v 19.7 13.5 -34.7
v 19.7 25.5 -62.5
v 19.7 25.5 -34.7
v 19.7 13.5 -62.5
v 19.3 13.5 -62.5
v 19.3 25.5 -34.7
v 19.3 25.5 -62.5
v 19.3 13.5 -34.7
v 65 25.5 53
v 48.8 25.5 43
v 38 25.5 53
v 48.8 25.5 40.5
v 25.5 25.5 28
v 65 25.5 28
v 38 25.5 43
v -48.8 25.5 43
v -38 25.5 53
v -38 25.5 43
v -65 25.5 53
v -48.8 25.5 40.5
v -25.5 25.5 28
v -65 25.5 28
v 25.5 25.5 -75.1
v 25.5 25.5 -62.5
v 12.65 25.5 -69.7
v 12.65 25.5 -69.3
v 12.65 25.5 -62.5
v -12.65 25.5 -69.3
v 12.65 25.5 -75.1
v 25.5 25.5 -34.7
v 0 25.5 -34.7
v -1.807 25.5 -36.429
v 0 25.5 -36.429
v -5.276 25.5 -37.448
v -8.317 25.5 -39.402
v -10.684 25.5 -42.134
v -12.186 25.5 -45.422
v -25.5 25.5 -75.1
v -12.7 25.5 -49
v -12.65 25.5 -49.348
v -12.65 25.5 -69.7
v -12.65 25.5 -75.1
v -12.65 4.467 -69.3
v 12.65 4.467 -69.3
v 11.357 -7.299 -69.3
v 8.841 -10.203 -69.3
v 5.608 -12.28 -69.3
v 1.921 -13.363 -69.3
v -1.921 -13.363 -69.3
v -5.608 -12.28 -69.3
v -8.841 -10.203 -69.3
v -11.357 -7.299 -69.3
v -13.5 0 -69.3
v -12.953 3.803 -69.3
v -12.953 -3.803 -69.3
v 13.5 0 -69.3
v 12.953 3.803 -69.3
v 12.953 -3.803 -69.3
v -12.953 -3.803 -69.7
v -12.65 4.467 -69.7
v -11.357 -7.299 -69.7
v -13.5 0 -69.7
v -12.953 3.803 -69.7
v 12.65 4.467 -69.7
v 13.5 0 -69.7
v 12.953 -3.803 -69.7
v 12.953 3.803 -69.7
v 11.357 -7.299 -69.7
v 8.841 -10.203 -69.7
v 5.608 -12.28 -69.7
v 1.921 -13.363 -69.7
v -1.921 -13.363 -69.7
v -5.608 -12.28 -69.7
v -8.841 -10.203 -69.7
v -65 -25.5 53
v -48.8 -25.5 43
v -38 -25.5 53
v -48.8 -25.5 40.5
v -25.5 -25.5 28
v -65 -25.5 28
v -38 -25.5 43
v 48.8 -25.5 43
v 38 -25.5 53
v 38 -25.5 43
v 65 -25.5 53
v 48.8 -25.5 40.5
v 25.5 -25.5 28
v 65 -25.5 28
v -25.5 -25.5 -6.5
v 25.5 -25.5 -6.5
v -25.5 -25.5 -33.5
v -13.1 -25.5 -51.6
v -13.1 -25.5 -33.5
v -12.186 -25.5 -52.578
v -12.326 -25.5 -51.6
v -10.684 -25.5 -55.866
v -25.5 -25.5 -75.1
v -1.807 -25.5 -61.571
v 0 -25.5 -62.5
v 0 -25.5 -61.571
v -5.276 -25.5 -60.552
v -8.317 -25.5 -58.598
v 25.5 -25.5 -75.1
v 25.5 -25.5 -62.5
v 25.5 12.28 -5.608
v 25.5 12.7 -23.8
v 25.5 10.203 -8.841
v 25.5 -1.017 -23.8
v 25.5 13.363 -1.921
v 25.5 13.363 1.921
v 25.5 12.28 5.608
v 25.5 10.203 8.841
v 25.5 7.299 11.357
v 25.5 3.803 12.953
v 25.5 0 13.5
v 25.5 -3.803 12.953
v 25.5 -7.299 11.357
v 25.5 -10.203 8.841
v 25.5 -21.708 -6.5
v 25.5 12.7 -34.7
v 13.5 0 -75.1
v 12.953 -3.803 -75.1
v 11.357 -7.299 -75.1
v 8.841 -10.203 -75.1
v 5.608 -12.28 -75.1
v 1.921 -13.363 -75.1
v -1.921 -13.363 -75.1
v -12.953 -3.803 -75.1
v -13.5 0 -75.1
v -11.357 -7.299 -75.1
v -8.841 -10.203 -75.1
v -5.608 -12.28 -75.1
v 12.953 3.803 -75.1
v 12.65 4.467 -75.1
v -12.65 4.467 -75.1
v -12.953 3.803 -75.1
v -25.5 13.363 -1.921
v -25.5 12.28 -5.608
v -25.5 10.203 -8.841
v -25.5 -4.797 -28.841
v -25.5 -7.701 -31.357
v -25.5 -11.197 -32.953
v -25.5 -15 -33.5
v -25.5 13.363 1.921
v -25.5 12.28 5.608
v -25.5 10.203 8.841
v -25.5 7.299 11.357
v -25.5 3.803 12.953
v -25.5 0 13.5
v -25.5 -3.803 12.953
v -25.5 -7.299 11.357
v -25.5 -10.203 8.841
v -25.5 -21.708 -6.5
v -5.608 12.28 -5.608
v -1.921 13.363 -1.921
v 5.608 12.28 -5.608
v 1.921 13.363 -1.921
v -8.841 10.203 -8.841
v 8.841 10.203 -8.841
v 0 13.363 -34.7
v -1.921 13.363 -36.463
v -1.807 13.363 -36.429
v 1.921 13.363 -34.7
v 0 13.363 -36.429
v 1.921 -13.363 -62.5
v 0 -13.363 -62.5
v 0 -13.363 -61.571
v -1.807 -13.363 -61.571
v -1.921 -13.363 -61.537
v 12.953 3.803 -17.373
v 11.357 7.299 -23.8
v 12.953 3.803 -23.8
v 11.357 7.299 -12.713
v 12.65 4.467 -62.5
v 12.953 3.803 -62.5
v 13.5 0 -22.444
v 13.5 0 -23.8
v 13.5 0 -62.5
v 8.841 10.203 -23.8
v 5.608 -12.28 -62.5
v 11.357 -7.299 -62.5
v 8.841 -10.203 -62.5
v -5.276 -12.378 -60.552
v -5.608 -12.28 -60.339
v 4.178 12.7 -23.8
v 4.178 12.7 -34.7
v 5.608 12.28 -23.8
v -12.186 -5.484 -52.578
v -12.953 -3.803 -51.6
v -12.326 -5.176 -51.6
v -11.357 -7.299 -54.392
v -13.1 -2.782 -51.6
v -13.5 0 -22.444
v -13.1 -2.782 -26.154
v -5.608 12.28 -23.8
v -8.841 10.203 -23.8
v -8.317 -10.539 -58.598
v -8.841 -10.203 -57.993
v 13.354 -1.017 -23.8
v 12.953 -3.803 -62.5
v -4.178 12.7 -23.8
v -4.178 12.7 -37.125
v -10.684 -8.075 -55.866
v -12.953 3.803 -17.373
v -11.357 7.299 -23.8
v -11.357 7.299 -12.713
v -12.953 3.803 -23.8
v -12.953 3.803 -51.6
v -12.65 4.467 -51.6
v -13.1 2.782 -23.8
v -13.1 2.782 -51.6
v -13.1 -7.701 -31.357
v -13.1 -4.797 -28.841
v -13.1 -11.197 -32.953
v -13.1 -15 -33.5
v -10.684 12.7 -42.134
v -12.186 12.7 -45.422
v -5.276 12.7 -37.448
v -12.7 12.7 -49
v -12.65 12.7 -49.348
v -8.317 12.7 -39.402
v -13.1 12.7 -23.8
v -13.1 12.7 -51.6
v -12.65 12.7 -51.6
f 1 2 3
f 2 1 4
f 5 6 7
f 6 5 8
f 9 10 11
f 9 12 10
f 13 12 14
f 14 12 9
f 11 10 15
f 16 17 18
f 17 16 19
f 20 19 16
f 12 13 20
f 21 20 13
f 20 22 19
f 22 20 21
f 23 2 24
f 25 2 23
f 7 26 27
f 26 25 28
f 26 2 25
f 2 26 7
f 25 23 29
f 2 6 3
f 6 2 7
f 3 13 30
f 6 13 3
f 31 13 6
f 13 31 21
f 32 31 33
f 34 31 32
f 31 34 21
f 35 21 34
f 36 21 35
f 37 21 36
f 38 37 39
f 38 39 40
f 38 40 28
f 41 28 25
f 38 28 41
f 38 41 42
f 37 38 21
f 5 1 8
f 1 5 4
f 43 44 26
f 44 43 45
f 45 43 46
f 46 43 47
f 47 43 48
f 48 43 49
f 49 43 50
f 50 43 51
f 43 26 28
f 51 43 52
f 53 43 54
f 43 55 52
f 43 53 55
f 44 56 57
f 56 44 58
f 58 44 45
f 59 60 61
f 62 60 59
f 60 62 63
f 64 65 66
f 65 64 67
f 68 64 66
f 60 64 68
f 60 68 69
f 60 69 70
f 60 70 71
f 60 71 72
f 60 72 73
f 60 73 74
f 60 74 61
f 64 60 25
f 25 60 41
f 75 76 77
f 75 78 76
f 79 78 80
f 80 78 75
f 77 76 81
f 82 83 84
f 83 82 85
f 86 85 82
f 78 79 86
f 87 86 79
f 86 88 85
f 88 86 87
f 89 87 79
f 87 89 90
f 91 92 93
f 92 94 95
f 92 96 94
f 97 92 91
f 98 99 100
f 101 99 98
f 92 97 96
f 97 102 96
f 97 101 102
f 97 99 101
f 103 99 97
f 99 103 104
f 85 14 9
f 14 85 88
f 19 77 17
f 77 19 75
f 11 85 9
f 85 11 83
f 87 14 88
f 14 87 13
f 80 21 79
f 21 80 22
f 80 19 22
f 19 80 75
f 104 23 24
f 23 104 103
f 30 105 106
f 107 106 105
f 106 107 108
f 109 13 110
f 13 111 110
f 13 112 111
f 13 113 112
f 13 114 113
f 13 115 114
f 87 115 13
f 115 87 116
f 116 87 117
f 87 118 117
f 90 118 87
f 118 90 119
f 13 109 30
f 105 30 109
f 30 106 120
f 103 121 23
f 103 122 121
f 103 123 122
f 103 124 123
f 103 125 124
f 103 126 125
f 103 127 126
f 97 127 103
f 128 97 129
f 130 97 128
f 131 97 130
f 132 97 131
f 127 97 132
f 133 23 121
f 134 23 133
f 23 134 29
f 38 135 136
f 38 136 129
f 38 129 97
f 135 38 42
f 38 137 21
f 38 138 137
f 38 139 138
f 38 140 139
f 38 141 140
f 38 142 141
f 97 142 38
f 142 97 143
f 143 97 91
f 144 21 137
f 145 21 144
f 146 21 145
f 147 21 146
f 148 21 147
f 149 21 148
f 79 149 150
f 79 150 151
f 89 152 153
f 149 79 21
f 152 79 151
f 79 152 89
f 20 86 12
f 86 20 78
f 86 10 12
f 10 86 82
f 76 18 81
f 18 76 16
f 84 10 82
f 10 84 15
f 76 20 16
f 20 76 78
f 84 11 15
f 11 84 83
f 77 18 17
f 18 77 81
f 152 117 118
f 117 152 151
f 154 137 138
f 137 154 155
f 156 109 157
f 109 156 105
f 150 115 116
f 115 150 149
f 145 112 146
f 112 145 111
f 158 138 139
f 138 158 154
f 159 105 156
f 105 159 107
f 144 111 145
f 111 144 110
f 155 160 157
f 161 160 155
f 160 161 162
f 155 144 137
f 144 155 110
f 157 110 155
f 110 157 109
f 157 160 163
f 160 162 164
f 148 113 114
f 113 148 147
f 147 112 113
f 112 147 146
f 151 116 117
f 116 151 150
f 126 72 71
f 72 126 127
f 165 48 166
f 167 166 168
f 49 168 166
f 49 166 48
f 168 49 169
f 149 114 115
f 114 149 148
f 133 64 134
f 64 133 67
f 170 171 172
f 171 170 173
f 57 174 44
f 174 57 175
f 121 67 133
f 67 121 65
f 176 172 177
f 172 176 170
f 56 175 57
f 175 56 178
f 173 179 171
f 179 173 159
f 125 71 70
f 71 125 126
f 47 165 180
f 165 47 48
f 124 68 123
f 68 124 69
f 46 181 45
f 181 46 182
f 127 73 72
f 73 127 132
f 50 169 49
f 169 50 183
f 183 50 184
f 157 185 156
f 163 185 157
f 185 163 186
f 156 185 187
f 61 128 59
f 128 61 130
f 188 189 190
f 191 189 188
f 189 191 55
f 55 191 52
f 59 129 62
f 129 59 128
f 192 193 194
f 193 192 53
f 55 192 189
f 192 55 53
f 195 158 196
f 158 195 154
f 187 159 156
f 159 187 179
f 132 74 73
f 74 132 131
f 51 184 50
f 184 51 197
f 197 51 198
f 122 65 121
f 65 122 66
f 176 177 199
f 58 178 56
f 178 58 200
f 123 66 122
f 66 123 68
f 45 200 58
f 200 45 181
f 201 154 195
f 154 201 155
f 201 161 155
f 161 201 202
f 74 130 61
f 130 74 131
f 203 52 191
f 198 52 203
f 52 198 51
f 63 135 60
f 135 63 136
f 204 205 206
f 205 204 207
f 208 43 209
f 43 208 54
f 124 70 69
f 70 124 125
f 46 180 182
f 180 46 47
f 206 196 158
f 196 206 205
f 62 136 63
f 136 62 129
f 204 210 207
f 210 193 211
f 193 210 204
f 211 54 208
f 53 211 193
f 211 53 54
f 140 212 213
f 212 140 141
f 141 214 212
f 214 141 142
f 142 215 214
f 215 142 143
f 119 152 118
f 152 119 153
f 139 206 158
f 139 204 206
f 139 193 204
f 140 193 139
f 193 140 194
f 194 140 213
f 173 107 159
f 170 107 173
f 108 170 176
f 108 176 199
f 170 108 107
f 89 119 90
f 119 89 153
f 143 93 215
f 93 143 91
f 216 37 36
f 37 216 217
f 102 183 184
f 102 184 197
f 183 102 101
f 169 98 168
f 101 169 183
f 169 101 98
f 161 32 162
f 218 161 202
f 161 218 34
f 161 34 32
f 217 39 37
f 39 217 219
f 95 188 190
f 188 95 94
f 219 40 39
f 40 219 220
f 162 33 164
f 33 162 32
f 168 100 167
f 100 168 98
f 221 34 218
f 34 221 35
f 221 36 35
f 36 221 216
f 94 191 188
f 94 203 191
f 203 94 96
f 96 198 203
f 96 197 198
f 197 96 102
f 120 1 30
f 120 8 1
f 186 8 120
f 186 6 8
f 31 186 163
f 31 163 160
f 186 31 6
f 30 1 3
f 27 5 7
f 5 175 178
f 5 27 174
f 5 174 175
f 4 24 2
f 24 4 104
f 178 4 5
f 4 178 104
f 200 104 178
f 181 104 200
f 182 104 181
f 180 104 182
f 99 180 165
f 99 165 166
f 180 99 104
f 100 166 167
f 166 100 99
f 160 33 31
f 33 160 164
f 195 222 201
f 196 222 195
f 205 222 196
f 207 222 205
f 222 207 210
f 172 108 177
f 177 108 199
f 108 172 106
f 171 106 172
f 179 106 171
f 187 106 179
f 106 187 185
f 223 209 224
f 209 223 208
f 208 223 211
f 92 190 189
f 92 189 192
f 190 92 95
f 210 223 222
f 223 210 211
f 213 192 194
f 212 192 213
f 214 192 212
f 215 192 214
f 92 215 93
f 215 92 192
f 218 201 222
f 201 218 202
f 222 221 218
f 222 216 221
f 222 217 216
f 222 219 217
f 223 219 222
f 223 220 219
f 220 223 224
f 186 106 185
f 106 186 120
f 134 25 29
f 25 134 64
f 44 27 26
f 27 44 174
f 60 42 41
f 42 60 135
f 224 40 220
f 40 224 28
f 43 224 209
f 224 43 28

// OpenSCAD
// Sign holder base depth.
sign_holder_depth=96;

// Sign holder thickness.
sign_holder_thickness=1.7;

// Bar diameter.
bar_dia=25.4;

// Wall thickness
wall=12;

// Space for hangers
hanger_space=15;

// Wiggle room.
wiggle=0.8;


/* [Hidden] */

inch=25.4;
holder_width = bar_dia+(wiggle+wall)*2;
holder_height = 90 +(wiggle+wall)*2;

module rack_top(w=0.0) {
  rotate([0,90,0])
    cylinder(r=bar_dia/2+w, h=150, center=true, $fn=22);
}
module rack_bottom(w=0.0) {
  translate([0,0,-100]) cylinder(r=bar_dia/2+w, h=100, $fn=22);
}

module rack(w=0.0) {
  rack_top(w);
  rack_bottom(w);
}


module sign(w = 0.0) {
  translate([0,-4.25*inch,0]) cube([3+w, 8.5*inch, 11*inch]);
  translate([-(sign_holder_depth/2)-wiggle,-4.25*inch,0])
   cube([sign_holder_depth+wiggle*2, 8.5*inch, sign_holder_thickness + w]);
}
% rack();
% translate([0,0,bar_dia/2 + wall + wiggle + hanger_space]) sign();

down_offset=20;
out_offset=15;

union() {

  translate([0,0,-50]) {
    translate([holder_width/2-wall/2,holder_width/2-wall/2,0]) 
    # cube([0.4,wall, bar_dia + wall], center=true);
    translate([0,0,-holder_width/2+wall/2]) 
    # cube([bar_dia + wall, holder_width, 0.4], center=true);
  }
  
  difference() {
    union() {
      translate([0,0,bar_dia/2 + wiggle + wall + hanger_space])
	cube([130, holder_width, 25], center=true);
      translate([0,0,bar_dia/2 + wiggle + wall -holder_height/2 + hanger_space])
	cube([holder_width, holder_width, holder_height], center=true);
    }

    translate([0,0,bar_dia/2 + wall + wiggle + hanger_space]) {
      sign(wiggle);
      translate([-38,-4.25*inch,0]) cube([96-20, 8.5*inch, 50]);
    }

    hull() {
      rack_top(wiggle);
      translate([0,-out_offset,-down_offset]) rack_top(wiggle);
    }
    hull() {
      translate([0,-out_offset,-down_offset]) rack_top(wiggle);
      translate([0,-30,-down_offset]) rack_top(wiggle);
    }

    rack(wiggle);

    // for (x=[0 : 10])
    translate([0,0,-49]) rotate([90,0,0]) translate([0,0,50]) rack_bottom();

    translate([0,-holder_width,-49-bar_dia/2-wiggle]) {
      cube([holder_width, holder_width*2, bar_dia+wiggle*3]);
    }
    translate([-bar_dia/2-wiggle/2,-holder_width+bar_dia/2,-bar_dia*2-wiggle]) {
      cube([holder_width, holder_width, bar_dia+wiggle*3]);
    }

    translate([-bar_dia/2+0.05,0,-holder_height+bar_dia]) {
      cube([bar_dia - 0.1, holder_width, holder_width-10]);
    }
  }
}
